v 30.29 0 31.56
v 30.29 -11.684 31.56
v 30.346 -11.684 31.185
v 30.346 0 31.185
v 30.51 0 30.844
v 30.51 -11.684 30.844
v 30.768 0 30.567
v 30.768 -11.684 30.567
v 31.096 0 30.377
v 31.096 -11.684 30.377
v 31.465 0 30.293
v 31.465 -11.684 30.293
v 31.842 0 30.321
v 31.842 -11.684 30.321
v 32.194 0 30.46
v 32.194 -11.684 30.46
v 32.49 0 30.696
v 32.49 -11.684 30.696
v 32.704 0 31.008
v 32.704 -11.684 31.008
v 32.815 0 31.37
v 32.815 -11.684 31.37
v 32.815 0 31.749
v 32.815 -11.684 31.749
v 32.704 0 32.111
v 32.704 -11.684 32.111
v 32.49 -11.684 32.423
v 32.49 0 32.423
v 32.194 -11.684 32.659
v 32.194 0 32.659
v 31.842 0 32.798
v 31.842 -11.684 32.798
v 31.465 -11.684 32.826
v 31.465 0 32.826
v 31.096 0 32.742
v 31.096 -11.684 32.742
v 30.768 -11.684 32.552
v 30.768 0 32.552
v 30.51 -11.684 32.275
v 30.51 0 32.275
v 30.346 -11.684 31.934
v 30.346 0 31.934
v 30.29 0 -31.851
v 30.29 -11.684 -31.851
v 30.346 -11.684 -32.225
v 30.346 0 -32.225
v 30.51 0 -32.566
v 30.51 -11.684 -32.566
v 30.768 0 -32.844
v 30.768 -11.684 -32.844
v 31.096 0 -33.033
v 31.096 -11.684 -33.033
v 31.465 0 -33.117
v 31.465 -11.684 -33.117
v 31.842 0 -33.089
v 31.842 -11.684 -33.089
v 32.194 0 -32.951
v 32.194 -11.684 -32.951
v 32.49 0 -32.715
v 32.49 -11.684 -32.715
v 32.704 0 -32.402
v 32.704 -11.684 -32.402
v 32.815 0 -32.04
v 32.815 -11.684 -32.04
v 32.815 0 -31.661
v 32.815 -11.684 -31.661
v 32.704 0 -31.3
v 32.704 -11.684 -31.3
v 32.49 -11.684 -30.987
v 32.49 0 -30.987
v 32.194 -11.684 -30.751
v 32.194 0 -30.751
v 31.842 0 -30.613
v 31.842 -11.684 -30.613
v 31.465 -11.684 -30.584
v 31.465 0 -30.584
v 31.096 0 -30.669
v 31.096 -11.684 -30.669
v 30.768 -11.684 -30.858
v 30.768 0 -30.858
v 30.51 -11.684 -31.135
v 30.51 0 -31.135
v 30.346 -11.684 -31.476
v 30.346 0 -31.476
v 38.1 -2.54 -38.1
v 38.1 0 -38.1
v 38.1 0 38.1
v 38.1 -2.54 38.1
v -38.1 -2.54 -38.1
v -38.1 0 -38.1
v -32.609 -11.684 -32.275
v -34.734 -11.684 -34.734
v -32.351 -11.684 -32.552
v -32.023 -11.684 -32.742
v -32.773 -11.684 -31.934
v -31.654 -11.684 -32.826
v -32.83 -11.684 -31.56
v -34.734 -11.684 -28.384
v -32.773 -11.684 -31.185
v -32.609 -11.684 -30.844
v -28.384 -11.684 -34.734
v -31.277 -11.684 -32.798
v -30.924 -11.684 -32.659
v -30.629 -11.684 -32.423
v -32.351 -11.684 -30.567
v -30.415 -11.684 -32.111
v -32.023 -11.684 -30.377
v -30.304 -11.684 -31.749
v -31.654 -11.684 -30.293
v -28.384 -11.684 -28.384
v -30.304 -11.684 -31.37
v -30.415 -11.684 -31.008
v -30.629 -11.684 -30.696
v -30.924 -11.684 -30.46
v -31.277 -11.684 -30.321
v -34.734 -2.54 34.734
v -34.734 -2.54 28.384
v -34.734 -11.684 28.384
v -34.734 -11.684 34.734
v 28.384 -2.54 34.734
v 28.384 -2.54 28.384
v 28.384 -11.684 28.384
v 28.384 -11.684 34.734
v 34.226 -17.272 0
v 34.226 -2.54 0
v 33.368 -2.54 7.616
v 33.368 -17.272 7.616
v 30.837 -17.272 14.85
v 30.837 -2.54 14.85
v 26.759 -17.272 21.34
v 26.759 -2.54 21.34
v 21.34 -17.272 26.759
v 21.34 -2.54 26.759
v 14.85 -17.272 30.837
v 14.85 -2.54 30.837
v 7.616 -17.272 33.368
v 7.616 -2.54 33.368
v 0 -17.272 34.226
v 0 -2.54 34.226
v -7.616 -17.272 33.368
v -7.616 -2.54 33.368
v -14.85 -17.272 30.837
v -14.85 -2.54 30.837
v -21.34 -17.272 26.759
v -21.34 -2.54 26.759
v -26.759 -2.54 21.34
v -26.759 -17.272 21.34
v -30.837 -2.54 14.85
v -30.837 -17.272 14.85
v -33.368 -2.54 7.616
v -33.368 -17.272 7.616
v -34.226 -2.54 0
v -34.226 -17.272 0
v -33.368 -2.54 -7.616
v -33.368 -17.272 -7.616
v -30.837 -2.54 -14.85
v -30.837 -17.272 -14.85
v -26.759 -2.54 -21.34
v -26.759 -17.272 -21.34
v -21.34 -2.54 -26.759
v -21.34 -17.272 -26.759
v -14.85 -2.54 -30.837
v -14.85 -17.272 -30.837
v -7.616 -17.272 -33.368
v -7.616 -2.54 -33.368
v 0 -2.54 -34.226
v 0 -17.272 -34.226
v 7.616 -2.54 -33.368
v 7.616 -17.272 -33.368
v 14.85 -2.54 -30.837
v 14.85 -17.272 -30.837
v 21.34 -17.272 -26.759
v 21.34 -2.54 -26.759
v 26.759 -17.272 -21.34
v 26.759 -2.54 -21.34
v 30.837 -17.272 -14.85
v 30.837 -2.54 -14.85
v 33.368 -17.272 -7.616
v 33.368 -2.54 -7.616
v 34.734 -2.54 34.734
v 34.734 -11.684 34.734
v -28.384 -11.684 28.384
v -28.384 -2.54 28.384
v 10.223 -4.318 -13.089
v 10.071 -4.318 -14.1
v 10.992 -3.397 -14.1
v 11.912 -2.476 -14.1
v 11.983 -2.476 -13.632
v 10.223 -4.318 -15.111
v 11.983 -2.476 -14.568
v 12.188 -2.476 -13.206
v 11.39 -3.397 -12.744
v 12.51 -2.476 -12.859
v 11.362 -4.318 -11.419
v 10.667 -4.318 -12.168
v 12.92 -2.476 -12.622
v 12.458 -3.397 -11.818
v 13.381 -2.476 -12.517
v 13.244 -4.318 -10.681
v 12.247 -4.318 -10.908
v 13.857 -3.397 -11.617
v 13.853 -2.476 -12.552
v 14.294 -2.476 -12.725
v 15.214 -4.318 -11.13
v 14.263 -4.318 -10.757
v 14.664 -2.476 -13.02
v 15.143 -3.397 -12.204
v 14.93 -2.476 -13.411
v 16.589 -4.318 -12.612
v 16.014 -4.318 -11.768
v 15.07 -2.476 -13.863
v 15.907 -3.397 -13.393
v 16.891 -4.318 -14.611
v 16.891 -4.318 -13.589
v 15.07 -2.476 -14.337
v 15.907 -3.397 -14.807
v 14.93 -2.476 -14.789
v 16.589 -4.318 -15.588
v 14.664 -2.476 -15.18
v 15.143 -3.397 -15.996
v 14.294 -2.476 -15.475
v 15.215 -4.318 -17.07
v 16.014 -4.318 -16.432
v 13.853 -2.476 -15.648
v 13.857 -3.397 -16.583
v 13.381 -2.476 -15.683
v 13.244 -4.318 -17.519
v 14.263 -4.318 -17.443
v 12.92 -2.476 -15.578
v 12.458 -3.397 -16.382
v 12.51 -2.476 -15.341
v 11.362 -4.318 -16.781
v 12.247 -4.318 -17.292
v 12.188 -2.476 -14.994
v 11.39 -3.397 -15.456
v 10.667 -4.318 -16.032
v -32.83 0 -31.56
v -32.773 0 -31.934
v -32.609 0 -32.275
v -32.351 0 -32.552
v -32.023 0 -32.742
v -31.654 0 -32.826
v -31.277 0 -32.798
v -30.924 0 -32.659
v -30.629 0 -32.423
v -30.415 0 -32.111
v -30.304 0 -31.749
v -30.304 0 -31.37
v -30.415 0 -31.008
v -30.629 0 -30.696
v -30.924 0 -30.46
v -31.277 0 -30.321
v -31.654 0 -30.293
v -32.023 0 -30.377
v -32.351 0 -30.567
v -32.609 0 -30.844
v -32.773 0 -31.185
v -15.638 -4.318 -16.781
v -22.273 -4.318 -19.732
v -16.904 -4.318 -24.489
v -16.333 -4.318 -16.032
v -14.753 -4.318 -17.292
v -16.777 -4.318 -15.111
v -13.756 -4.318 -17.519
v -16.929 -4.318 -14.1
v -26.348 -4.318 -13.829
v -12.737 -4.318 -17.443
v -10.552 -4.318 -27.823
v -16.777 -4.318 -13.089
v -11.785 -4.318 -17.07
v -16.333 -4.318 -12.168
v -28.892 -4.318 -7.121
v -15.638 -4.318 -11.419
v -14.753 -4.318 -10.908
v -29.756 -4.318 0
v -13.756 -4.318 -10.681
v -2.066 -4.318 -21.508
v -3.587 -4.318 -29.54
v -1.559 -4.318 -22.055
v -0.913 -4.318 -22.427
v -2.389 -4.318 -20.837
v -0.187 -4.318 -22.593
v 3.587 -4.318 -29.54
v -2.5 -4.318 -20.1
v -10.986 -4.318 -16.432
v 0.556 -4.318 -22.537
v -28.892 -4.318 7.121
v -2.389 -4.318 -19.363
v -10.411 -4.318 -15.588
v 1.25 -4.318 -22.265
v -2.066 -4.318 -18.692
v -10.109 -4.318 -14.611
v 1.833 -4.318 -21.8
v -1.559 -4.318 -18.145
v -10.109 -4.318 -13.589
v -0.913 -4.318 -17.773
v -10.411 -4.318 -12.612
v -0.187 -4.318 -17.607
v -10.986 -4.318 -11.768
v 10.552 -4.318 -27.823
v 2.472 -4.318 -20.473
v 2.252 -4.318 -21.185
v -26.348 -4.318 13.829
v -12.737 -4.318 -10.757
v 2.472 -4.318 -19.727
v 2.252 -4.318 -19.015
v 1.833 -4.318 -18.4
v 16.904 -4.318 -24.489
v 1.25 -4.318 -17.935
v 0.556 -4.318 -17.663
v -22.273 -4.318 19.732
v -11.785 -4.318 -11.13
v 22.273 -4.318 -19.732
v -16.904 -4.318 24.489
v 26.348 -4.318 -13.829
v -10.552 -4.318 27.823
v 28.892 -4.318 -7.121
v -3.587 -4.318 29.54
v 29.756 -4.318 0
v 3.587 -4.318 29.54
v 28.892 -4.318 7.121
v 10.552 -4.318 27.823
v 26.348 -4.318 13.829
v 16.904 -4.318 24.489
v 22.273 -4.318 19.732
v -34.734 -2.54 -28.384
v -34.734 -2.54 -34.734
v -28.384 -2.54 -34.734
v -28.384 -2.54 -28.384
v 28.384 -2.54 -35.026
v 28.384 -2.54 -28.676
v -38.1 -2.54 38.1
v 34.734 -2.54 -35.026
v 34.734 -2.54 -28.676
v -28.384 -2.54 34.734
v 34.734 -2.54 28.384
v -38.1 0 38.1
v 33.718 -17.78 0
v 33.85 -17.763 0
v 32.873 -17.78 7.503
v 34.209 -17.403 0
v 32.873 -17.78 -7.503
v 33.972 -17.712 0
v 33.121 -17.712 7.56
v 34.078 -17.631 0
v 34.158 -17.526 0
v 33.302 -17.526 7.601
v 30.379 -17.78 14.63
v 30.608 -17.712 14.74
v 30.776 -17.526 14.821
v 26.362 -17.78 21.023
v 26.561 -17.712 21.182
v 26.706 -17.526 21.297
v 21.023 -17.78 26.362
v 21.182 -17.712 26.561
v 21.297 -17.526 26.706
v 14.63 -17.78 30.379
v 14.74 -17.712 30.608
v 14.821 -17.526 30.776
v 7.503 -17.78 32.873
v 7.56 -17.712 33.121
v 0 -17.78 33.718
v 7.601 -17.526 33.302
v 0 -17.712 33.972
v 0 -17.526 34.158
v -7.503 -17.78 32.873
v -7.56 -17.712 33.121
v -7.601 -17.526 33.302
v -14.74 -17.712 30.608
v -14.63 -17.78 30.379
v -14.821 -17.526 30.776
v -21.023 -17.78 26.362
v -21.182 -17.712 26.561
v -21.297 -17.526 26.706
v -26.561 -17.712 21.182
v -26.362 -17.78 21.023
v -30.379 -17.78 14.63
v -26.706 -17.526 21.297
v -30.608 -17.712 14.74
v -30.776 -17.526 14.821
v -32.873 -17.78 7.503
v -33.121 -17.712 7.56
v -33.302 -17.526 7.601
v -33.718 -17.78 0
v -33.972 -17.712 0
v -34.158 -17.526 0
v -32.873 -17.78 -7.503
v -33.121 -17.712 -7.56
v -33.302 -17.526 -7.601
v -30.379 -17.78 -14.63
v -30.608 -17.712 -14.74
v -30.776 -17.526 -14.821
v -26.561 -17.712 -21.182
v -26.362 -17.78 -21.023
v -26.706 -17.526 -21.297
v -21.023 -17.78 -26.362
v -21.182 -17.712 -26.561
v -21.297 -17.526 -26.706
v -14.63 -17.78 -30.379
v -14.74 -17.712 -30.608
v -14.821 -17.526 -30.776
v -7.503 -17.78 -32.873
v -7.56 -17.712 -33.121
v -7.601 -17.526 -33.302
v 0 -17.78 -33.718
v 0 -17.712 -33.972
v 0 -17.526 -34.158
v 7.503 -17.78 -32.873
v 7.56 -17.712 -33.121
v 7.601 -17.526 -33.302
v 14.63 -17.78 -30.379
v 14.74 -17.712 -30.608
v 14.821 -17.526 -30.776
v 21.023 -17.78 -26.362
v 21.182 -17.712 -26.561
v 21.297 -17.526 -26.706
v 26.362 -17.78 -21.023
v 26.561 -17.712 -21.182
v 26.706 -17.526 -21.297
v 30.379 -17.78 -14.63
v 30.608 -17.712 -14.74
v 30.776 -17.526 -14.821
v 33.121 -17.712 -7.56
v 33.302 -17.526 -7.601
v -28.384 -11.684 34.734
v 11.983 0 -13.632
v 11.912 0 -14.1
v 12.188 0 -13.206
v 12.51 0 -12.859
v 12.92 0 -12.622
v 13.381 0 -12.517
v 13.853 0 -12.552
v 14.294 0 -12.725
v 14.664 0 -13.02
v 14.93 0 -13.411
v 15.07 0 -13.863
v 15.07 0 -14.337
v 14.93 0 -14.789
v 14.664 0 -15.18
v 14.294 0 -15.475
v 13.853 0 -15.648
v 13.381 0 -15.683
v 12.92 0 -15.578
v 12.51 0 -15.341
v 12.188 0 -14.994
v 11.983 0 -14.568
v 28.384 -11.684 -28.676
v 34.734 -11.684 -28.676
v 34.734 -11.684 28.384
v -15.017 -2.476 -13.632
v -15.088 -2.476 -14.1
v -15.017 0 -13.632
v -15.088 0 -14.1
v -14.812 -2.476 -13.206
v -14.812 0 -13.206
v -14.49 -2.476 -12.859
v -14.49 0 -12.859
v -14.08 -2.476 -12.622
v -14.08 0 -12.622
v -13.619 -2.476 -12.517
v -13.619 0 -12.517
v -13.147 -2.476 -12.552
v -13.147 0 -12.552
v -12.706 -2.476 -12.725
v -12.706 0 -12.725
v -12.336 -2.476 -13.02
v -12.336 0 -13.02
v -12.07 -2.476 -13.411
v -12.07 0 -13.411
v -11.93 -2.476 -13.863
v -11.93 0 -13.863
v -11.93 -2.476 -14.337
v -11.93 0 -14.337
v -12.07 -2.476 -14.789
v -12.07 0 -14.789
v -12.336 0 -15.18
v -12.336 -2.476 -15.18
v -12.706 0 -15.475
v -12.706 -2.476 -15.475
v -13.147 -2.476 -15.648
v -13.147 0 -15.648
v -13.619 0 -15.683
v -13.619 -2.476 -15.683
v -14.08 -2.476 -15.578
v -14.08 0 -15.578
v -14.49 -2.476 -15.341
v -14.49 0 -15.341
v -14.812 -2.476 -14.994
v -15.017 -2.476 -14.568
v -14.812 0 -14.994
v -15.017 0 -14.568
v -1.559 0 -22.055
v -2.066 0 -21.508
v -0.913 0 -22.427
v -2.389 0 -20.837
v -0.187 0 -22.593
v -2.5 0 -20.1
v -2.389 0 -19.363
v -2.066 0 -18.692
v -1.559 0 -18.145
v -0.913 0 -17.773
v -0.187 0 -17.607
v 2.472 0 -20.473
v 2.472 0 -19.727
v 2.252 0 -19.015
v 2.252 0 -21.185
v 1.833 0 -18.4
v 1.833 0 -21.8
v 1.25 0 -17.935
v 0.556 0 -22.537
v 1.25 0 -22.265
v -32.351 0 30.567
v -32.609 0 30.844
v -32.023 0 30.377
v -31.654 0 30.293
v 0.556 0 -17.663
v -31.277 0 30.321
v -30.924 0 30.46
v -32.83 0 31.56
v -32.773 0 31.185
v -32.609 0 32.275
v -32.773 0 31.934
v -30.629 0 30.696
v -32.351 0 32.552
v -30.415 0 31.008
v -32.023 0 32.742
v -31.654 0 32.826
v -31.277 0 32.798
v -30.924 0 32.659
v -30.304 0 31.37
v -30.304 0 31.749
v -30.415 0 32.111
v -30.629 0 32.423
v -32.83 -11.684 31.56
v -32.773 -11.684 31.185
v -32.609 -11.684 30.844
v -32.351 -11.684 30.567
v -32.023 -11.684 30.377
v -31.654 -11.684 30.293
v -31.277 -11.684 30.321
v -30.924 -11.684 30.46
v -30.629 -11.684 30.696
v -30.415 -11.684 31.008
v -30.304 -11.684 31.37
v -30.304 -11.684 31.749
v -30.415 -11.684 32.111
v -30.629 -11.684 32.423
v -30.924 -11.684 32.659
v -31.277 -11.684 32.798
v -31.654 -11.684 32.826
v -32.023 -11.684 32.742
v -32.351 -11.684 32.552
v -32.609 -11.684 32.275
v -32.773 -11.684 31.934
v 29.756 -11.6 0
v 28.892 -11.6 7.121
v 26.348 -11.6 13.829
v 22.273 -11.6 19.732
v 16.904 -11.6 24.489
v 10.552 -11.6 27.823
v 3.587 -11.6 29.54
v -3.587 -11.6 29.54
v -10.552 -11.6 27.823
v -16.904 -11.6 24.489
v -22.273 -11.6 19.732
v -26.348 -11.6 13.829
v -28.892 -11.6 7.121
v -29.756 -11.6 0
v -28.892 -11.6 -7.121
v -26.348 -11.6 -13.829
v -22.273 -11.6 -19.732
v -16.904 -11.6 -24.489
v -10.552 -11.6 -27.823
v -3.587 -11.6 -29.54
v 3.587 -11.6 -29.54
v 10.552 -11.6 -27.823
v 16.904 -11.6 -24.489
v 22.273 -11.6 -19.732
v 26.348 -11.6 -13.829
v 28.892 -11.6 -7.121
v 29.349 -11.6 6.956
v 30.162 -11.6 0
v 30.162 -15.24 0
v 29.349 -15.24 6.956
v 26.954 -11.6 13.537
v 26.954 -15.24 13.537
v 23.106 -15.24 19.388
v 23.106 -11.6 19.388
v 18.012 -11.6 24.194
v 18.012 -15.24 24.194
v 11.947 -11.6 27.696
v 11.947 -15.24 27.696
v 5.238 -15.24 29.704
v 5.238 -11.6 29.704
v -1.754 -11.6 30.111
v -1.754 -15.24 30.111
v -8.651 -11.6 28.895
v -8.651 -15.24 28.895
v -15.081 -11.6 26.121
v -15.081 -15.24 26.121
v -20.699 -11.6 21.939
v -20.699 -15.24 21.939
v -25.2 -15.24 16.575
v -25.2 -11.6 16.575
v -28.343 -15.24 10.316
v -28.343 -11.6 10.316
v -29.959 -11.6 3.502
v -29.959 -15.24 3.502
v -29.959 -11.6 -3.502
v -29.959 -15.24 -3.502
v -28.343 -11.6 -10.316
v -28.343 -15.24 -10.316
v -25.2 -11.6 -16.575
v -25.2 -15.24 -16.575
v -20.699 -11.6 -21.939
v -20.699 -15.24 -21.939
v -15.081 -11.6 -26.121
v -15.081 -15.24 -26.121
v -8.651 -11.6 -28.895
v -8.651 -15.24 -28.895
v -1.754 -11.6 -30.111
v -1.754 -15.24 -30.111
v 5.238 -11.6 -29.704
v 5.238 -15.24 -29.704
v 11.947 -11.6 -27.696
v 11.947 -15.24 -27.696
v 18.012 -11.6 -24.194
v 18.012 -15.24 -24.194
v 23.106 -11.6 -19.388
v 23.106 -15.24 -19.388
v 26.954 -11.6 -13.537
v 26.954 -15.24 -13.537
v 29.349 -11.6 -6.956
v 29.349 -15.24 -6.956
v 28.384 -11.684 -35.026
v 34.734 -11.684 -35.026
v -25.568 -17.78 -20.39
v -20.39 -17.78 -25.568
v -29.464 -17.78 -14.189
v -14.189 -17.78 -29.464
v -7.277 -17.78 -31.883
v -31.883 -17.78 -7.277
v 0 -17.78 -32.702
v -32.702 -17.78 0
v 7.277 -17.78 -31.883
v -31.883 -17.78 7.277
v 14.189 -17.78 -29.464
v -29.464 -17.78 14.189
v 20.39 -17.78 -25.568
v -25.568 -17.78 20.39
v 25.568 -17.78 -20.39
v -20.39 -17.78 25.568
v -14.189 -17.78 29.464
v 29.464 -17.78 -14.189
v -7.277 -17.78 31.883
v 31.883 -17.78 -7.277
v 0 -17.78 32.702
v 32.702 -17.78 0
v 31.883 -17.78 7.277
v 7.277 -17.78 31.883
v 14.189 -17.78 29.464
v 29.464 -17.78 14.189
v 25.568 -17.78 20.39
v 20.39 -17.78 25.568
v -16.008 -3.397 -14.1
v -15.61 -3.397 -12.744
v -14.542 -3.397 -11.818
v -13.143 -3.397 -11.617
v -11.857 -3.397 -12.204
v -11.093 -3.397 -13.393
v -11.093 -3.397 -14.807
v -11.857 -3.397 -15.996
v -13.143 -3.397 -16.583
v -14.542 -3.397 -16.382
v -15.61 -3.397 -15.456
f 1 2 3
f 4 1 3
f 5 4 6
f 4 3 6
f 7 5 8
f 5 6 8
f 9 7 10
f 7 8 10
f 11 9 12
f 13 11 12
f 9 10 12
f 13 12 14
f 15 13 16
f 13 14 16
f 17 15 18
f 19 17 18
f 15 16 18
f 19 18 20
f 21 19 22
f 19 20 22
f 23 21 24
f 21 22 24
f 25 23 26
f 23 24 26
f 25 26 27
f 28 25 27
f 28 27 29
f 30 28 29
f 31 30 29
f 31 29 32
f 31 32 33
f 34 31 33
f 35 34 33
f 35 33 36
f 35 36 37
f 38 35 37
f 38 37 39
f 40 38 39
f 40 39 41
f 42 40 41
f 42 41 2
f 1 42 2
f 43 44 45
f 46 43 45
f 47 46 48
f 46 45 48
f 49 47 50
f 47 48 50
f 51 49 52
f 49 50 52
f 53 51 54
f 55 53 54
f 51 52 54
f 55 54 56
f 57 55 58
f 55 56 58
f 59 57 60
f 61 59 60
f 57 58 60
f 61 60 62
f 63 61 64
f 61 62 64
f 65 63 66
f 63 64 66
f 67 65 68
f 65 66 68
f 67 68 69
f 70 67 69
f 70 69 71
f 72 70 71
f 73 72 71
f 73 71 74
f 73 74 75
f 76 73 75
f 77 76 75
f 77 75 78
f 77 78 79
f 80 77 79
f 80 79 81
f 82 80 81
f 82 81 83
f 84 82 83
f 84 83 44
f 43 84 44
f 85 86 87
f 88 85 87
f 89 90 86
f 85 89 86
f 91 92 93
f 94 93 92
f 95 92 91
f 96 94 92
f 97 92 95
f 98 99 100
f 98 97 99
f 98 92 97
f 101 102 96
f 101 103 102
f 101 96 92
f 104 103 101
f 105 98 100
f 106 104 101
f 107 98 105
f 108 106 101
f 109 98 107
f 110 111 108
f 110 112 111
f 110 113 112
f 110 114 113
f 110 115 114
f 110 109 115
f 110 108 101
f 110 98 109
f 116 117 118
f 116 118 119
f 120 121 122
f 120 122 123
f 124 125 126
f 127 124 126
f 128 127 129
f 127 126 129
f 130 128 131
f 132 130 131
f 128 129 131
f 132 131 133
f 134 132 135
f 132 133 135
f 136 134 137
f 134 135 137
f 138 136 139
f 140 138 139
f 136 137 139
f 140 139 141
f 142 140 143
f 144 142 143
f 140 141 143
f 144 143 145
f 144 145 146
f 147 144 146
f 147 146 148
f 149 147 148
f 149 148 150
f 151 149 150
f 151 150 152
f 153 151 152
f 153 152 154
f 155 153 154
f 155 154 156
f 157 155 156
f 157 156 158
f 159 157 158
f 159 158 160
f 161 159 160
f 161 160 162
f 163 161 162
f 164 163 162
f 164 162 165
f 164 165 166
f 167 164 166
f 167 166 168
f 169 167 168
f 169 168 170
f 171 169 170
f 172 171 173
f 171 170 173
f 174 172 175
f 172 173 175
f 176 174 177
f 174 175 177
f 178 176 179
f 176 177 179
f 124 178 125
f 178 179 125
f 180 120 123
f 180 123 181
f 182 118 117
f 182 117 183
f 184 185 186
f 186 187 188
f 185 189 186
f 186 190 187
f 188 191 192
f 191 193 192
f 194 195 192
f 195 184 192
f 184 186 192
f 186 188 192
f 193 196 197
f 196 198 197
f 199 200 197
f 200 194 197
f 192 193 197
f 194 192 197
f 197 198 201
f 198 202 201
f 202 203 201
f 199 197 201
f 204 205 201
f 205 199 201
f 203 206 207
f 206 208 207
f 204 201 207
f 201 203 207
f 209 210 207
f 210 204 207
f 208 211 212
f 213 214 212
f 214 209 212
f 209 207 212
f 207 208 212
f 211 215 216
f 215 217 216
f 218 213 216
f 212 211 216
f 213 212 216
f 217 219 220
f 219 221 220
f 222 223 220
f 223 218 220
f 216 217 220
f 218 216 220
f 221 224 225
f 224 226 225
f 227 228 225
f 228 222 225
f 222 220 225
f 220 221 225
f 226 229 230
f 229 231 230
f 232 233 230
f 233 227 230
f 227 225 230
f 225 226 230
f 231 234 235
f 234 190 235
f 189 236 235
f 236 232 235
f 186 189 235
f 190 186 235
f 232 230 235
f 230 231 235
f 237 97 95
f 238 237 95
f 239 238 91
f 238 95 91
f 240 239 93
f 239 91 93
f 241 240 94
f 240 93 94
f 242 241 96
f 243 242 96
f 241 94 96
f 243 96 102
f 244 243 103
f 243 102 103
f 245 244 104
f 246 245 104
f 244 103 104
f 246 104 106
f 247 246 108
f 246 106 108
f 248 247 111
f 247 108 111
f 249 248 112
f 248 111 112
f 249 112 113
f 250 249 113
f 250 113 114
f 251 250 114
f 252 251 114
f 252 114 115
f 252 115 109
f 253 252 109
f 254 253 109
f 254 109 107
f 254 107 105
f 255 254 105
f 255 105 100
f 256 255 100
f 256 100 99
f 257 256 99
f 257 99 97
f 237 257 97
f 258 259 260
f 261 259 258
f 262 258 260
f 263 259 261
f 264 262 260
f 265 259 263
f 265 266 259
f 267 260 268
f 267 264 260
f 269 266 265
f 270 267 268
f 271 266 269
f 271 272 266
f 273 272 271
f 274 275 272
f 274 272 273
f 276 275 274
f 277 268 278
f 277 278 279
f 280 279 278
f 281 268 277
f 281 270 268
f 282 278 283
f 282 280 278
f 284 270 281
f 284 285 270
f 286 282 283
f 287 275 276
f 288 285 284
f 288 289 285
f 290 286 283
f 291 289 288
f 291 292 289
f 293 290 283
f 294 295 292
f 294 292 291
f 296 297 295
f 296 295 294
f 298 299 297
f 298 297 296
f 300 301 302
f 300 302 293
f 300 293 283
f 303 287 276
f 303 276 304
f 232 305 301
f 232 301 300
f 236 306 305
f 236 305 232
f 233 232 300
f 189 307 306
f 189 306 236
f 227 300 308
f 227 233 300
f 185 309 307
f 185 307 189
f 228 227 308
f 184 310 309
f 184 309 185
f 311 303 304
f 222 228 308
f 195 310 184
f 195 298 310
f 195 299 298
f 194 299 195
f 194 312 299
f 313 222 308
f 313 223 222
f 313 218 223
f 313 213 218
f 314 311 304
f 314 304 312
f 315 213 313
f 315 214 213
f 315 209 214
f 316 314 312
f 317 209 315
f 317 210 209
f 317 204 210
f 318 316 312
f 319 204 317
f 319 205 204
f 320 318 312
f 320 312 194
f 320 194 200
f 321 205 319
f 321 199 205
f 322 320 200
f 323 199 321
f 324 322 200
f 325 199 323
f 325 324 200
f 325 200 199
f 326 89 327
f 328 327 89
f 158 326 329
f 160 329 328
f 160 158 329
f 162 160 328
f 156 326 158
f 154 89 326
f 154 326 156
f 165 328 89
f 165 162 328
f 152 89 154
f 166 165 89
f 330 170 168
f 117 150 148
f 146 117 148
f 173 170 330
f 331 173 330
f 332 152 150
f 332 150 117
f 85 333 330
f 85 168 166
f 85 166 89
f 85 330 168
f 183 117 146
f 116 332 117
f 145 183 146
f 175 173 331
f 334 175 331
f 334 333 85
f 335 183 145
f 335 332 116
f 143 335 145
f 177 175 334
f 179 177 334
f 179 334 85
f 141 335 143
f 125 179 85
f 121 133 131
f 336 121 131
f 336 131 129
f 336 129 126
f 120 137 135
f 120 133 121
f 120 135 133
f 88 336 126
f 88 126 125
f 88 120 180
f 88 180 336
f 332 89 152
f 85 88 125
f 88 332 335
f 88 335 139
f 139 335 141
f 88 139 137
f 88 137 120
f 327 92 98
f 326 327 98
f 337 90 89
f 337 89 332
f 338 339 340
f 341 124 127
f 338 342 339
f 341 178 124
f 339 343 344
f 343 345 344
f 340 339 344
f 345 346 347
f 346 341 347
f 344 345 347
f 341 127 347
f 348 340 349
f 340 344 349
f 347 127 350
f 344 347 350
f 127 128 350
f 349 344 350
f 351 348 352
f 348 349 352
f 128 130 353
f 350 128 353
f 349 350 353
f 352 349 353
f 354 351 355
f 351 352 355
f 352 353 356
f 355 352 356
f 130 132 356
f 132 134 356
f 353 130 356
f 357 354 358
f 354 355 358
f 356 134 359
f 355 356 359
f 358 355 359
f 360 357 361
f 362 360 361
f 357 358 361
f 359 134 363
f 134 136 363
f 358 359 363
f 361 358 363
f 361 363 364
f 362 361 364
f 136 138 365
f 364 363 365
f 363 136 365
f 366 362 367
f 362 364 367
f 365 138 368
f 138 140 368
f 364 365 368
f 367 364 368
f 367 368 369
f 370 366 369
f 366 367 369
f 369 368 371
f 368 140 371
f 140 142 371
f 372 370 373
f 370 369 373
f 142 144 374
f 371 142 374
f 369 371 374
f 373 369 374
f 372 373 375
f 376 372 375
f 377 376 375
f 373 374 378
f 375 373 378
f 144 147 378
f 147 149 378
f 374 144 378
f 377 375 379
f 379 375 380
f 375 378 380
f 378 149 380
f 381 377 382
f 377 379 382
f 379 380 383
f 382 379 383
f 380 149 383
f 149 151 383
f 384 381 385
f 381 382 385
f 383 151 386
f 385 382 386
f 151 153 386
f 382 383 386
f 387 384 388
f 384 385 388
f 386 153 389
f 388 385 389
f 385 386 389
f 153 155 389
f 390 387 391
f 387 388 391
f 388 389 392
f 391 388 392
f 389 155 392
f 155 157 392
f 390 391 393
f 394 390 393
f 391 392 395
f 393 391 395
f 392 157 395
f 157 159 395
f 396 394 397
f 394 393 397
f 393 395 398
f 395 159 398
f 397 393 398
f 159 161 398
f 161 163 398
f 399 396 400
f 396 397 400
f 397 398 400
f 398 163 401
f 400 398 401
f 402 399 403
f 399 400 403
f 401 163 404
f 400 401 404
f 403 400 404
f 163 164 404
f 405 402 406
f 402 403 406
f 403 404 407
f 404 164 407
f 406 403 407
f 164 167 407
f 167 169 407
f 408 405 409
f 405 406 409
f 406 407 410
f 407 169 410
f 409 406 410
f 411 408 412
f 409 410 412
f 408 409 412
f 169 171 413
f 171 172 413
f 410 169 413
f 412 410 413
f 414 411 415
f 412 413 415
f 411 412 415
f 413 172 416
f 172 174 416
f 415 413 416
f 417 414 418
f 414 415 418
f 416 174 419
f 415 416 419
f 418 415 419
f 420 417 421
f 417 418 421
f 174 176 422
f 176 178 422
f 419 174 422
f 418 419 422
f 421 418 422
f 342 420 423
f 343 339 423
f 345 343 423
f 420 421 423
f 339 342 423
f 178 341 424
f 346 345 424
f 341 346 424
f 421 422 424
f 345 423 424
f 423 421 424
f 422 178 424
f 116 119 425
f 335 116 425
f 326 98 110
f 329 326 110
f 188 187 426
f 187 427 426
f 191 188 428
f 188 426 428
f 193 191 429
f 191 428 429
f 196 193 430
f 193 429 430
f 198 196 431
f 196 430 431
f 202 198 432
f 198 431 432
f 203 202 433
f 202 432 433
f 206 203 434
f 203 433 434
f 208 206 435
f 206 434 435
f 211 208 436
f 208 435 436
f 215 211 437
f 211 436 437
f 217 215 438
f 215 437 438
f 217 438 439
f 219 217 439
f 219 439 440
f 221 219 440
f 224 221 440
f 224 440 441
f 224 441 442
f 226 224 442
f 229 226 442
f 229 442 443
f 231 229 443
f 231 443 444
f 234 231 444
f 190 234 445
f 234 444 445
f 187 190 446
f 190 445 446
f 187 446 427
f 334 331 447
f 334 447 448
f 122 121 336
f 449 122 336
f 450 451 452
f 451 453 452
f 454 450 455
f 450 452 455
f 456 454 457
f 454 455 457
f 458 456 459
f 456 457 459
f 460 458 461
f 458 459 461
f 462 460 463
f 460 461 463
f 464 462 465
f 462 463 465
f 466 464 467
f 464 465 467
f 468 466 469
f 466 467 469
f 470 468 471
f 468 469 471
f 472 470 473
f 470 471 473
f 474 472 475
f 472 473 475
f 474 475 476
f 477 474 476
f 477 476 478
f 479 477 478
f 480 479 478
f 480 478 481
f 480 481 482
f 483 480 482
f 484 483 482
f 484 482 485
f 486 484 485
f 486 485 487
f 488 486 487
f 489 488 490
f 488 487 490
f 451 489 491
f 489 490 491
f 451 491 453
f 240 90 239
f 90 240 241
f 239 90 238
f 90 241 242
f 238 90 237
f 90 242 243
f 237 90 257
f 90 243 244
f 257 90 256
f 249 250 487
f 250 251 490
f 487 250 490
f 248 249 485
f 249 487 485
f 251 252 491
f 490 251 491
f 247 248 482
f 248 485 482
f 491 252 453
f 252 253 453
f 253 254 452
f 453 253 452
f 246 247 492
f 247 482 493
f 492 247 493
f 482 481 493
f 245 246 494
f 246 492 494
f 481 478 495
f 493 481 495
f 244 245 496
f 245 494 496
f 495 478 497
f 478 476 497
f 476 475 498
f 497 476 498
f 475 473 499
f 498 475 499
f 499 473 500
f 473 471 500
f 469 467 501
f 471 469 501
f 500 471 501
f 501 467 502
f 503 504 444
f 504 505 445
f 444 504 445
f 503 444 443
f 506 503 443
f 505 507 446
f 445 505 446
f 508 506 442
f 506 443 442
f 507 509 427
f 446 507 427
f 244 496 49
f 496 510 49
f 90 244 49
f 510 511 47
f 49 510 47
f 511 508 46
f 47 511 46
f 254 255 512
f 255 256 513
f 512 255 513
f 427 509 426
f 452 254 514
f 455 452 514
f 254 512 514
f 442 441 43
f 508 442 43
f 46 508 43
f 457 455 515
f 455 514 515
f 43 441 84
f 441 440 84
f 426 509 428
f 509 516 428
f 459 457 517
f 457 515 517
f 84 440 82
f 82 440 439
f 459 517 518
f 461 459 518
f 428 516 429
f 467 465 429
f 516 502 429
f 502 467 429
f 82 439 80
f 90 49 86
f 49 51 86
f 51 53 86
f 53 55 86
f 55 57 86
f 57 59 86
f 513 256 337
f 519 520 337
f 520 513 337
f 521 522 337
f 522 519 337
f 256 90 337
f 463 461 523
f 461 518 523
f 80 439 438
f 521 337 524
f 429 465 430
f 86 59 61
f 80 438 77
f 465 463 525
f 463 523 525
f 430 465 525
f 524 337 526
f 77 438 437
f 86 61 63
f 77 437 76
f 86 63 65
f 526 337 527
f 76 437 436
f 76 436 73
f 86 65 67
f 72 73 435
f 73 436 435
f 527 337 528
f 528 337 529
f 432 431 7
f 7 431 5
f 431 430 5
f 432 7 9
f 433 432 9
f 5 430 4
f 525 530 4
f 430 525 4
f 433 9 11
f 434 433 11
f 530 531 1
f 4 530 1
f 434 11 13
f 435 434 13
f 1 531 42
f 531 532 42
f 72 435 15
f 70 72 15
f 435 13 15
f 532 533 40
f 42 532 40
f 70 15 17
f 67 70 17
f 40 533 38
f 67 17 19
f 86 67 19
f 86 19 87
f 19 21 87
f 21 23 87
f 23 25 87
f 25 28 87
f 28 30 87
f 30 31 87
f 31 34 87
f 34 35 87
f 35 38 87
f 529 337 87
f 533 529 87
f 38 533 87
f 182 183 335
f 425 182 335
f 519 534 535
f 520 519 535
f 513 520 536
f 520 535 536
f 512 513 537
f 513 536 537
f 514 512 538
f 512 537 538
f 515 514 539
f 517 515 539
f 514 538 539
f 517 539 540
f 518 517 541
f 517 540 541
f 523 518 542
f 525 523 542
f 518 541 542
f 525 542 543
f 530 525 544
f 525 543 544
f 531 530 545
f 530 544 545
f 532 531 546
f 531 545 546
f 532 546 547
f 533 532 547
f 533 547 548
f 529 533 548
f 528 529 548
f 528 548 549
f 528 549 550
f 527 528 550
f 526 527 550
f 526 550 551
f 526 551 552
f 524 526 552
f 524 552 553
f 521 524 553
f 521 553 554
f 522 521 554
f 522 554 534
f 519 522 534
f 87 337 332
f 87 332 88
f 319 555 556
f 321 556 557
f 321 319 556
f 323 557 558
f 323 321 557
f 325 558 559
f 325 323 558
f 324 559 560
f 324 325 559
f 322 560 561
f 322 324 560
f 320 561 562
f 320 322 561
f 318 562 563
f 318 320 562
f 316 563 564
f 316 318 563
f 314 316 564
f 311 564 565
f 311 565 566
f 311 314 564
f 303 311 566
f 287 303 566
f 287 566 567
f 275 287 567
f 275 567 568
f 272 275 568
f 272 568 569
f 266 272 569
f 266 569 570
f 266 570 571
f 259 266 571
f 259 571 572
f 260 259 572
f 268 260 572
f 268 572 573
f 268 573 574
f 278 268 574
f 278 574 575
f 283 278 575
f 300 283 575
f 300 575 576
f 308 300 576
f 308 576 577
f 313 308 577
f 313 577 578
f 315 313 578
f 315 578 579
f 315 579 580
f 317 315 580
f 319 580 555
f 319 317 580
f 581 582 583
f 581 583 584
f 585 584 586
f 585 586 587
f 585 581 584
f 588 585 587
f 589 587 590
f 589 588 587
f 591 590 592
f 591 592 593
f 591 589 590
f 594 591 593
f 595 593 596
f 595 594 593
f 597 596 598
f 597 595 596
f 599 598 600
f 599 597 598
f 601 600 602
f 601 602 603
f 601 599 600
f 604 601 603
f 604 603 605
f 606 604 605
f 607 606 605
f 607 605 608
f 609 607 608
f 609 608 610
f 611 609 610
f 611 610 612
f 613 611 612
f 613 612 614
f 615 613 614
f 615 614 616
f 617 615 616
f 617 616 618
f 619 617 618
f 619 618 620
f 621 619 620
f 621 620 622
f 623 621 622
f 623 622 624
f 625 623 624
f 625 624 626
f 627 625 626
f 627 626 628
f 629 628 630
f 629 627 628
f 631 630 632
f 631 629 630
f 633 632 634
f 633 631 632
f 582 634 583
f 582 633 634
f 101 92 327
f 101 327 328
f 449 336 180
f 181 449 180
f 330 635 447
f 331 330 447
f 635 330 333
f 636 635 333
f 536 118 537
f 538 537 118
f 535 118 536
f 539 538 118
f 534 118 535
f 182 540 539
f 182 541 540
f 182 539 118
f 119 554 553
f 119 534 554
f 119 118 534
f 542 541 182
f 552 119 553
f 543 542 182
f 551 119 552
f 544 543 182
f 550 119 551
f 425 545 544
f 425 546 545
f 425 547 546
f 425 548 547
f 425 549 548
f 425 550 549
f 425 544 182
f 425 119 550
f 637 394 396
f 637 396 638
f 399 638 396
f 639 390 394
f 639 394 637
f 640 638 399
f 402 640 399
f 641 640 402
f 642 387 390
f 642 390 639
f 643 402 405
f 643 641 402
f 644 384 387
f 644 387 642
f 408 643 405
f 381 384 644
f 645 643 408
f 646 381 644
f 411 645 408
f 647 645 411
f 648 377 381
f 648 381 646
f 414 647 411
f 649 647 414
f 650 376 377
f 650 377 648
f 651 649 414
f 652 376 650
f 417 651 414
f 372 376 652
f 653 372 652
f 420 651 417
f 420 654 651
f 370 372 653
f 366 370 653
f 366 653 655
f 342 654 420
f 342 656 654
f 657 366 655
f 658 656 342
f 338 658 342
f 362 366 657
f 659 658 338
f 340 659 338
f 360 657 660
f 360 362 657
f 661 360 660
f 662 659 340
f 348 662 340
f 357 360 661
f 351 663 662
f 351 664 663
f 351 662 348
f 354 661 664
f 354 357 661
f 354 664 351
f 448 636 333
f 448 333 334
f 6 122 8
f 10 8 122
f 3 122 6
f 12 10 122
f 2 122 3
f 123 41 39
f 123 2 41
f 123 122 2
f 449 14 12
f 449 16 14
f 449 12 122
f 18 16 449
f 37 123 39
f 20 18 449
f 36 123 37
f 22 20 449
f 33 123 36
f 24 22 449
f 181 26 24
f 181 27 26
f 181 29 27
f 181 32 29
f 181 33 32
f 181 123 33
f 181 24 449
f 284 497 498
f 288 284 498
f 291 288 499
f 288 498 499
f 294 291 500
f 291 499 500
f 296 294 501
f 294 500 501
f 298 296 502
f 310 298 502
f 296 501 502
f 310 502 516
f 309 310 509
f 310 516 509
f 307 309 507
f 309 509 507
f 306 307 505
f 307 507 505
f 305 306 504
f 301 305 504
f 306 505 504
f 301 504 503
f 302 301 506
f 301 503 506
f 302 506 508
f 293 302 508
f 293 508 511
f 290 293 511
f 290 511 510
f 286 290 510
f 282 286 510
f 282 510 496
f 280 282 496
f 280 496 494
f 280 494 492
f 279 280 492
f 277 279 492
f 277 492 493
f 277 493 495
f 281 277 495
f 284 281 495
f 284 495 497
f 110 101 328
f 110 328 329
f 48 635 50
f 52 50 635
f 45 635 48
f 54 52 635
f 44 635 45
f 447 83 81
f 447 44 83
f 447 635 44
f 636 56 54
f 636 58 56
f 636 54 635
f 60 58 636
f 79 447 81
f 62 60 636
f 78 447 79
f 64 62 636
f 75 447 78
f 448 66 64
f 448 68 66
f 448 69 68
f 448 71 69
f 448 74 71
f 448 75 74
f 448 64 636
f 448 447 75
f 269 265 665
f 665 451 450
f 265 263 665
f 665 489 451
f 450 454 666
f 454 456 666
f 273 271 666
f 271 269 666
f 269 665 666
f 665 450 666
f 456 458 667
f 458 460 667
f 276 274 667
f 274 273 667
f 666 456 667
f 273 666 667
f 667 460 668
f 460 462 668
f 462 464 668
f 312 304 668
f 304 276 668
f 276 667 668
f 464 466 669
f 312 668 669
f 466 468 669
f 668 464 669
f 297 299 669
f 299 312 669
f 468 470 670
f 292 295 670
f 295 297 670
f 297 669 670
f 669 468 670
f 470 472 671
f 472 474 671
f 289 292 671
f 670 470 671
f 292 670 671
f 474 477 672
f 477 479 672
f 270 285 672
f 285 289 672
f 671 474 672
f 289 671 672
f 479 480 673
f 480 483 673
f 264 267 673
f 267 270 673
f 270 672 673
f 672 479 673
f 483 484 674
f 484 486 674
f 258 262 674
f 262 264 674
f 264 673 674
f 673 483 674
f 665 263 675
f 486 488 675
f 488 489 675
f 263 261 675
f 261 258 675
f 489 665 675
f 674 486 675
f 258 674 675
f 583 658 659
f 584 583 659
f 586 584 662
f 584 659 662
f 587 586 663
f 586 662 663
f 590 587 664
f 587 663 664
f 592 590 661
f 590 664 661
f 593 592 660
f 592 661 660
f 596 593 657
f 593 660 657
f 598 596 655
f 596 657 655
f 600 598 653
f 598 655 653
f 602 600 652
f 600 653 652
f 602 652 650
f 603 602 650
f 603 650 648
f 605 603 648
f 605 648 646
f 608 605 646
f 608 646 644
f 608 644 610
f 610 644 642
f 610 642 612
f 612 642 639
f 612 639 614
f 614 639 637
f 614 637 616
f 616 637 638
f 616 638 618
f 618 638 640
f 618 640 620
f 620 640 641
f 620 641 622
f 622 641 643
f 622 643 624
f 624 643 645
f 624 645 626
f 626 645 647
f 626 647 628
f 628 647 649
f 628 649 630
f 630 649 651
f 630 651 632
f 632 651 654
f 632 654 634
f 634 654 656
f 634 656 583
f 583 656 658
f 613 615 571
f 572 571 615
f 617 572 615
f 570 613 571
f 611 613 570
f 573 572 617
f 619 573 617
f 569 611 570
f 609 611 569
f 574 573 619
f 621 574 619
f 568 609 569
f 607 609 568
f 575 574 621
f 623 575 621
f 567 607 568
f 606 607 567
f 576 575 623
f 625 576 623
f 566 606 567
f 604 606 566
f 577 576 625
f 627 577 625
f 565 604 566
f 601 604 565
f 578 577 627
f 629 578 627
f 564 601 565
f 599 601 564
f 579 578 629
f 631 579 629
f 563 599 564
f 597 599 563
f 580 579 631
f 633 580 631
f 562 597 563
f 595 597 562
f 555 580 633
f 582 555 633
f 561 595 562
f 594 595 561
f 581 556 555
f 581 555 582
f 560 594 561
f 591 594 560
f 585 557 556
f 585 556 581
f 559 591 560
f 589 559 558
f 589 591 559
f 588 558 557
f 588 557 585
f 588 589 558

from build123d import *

# Parameters (mm, degrees)
F0_R           = 30.1625
F1_DEPTH       = 4.318
F2_R           = 34.2265
F2_R_2         = 30.1625
F3_DEPTH       = 17.78
F0_W           = 76.2
F0_H           = 76.2
F0_W_2         = 6.35
F0_H_2         = 6.35
F4_DEPTH       = 2.54
F5_DEPTH       = 11.684
F6_D           = 2.54
F8_D           = 3.175
F8_CSINK_D     = 6.858
F8_CSINK_ANGLE = 90
F9_SIZE        = 2.54
F10_R          = 0.508
F11_R          = 30.1625
F11_R_2        = 29.7565
F12_DEPTH      = 11.6
F13_D          = 5


with BuildPart() as f1:
    # F0 (on Front) → F1 (new body)
    with BuildSketch(Plane.XZ):
        Circle(F0_R)
    extrude(amount=F1_DEPTH)

    # F2 (on Front) → F3 (join)
    with BuildSketch(Plane.XZ):
        Circle(F2_R)
        Circle(F2_R_2, mode=Mode.SUBTRACT)
    extrude(amount=F3_DEPTH)

    # F0 (on Front) → F4 (join)
    with BuildSketch(Plane.XZ):
        Rectangle(F0_W, F0_H)
        with Locations((-31.5595, -31.5595)):
            Rectangle(F0_W_2, F0_H_2, mode=Mode.SUBTRACT)
        with Locations((31.5595, -31.8507122787)):
            Rectangle(F0_W_2, F0_H_2, mode=Mode.SUBTRACT)
        with Locations((-31.5595, 31.5595)):
            Rectangle(F0_W_2, F0_H_2, mode=Mode.SUBTRACT)
        Circle(F0_R, mode=Mode.SUBTRACT)
        with Locations((31.5595, 31.5595)):
            Rectangle(F0_W_2, F0_H_2, mode=Mode.SUBTRACT)
    extrude(amount=F4_DEPTH)

    # F0 (on Front) → F5 (join)
    with BuildSketch(Plane.XZ):
        with Locations((-31.5595, -31.5595)):
            Rectangle(F0_W_2, F0_H_2)
        with Locations((-31.5595, 31.5595)):
            Rectangle(F0_W_2, F0_H_2)
        with Locations((31.5595, 31.5595)):
            Rectangle(F0_W_2, F0_H_2)
        with Locations((31.5595, -31.8507122787)):
            Rectangle(F0_W_2, F0_H_2)
    extrude(amount=F5_DEPTH)

    # F6 (through all)
    with Locations(Plane(origin=(0, 0, 0), x_dir=(1, 0, 0), z_dir=(0, 1, 0))):
        with Locations((-31.5595, -31.5595), (31.5595, -31.5595), (-31.5595, 31.5595), (31.5595, 31.8507122787)):
            Hole(F6_D / 2)

    # F8 (through all)
    with Locations(Plane.XZ.offset(4.318)):
        with Locations((-13.5, -14.1), (13.5, -14.1)):
            CounterSinkHole(F8_D / 2, F8_CSINK_D / 2, counter_sink_angle=F8_CSINK_ANGLE)

    # F9
    f9_edges = [f1.edges().sort_by_distance(p)[0] for p in [
        (-30.1625, -17.78, 0),
    ]]
    chamfer(f9_edges, length=F9_SIZE)

    # F10
    f10_edges = [f1.edges().sort_by_distance(p)[0] for p in [
        (-34.2265, -17.78, 0),
    ]]
    fillet(f10_edges, radius=F10_R)

    # F11 (on Front) → F12 (join)
    with BuildSketch(Plane.XZ):
        Circle(F11_R)
        Circle(F11_R_2, mode=Mode.SUBTRACT)
    extrude(amount=F12_DEPTH)

    # F13 (through all)
    with Locations(Plane.XZ.offset(4.318)):
        with Locations((0, -20.1)):
            Hole(F13_D / 2)


solid = f1.part
